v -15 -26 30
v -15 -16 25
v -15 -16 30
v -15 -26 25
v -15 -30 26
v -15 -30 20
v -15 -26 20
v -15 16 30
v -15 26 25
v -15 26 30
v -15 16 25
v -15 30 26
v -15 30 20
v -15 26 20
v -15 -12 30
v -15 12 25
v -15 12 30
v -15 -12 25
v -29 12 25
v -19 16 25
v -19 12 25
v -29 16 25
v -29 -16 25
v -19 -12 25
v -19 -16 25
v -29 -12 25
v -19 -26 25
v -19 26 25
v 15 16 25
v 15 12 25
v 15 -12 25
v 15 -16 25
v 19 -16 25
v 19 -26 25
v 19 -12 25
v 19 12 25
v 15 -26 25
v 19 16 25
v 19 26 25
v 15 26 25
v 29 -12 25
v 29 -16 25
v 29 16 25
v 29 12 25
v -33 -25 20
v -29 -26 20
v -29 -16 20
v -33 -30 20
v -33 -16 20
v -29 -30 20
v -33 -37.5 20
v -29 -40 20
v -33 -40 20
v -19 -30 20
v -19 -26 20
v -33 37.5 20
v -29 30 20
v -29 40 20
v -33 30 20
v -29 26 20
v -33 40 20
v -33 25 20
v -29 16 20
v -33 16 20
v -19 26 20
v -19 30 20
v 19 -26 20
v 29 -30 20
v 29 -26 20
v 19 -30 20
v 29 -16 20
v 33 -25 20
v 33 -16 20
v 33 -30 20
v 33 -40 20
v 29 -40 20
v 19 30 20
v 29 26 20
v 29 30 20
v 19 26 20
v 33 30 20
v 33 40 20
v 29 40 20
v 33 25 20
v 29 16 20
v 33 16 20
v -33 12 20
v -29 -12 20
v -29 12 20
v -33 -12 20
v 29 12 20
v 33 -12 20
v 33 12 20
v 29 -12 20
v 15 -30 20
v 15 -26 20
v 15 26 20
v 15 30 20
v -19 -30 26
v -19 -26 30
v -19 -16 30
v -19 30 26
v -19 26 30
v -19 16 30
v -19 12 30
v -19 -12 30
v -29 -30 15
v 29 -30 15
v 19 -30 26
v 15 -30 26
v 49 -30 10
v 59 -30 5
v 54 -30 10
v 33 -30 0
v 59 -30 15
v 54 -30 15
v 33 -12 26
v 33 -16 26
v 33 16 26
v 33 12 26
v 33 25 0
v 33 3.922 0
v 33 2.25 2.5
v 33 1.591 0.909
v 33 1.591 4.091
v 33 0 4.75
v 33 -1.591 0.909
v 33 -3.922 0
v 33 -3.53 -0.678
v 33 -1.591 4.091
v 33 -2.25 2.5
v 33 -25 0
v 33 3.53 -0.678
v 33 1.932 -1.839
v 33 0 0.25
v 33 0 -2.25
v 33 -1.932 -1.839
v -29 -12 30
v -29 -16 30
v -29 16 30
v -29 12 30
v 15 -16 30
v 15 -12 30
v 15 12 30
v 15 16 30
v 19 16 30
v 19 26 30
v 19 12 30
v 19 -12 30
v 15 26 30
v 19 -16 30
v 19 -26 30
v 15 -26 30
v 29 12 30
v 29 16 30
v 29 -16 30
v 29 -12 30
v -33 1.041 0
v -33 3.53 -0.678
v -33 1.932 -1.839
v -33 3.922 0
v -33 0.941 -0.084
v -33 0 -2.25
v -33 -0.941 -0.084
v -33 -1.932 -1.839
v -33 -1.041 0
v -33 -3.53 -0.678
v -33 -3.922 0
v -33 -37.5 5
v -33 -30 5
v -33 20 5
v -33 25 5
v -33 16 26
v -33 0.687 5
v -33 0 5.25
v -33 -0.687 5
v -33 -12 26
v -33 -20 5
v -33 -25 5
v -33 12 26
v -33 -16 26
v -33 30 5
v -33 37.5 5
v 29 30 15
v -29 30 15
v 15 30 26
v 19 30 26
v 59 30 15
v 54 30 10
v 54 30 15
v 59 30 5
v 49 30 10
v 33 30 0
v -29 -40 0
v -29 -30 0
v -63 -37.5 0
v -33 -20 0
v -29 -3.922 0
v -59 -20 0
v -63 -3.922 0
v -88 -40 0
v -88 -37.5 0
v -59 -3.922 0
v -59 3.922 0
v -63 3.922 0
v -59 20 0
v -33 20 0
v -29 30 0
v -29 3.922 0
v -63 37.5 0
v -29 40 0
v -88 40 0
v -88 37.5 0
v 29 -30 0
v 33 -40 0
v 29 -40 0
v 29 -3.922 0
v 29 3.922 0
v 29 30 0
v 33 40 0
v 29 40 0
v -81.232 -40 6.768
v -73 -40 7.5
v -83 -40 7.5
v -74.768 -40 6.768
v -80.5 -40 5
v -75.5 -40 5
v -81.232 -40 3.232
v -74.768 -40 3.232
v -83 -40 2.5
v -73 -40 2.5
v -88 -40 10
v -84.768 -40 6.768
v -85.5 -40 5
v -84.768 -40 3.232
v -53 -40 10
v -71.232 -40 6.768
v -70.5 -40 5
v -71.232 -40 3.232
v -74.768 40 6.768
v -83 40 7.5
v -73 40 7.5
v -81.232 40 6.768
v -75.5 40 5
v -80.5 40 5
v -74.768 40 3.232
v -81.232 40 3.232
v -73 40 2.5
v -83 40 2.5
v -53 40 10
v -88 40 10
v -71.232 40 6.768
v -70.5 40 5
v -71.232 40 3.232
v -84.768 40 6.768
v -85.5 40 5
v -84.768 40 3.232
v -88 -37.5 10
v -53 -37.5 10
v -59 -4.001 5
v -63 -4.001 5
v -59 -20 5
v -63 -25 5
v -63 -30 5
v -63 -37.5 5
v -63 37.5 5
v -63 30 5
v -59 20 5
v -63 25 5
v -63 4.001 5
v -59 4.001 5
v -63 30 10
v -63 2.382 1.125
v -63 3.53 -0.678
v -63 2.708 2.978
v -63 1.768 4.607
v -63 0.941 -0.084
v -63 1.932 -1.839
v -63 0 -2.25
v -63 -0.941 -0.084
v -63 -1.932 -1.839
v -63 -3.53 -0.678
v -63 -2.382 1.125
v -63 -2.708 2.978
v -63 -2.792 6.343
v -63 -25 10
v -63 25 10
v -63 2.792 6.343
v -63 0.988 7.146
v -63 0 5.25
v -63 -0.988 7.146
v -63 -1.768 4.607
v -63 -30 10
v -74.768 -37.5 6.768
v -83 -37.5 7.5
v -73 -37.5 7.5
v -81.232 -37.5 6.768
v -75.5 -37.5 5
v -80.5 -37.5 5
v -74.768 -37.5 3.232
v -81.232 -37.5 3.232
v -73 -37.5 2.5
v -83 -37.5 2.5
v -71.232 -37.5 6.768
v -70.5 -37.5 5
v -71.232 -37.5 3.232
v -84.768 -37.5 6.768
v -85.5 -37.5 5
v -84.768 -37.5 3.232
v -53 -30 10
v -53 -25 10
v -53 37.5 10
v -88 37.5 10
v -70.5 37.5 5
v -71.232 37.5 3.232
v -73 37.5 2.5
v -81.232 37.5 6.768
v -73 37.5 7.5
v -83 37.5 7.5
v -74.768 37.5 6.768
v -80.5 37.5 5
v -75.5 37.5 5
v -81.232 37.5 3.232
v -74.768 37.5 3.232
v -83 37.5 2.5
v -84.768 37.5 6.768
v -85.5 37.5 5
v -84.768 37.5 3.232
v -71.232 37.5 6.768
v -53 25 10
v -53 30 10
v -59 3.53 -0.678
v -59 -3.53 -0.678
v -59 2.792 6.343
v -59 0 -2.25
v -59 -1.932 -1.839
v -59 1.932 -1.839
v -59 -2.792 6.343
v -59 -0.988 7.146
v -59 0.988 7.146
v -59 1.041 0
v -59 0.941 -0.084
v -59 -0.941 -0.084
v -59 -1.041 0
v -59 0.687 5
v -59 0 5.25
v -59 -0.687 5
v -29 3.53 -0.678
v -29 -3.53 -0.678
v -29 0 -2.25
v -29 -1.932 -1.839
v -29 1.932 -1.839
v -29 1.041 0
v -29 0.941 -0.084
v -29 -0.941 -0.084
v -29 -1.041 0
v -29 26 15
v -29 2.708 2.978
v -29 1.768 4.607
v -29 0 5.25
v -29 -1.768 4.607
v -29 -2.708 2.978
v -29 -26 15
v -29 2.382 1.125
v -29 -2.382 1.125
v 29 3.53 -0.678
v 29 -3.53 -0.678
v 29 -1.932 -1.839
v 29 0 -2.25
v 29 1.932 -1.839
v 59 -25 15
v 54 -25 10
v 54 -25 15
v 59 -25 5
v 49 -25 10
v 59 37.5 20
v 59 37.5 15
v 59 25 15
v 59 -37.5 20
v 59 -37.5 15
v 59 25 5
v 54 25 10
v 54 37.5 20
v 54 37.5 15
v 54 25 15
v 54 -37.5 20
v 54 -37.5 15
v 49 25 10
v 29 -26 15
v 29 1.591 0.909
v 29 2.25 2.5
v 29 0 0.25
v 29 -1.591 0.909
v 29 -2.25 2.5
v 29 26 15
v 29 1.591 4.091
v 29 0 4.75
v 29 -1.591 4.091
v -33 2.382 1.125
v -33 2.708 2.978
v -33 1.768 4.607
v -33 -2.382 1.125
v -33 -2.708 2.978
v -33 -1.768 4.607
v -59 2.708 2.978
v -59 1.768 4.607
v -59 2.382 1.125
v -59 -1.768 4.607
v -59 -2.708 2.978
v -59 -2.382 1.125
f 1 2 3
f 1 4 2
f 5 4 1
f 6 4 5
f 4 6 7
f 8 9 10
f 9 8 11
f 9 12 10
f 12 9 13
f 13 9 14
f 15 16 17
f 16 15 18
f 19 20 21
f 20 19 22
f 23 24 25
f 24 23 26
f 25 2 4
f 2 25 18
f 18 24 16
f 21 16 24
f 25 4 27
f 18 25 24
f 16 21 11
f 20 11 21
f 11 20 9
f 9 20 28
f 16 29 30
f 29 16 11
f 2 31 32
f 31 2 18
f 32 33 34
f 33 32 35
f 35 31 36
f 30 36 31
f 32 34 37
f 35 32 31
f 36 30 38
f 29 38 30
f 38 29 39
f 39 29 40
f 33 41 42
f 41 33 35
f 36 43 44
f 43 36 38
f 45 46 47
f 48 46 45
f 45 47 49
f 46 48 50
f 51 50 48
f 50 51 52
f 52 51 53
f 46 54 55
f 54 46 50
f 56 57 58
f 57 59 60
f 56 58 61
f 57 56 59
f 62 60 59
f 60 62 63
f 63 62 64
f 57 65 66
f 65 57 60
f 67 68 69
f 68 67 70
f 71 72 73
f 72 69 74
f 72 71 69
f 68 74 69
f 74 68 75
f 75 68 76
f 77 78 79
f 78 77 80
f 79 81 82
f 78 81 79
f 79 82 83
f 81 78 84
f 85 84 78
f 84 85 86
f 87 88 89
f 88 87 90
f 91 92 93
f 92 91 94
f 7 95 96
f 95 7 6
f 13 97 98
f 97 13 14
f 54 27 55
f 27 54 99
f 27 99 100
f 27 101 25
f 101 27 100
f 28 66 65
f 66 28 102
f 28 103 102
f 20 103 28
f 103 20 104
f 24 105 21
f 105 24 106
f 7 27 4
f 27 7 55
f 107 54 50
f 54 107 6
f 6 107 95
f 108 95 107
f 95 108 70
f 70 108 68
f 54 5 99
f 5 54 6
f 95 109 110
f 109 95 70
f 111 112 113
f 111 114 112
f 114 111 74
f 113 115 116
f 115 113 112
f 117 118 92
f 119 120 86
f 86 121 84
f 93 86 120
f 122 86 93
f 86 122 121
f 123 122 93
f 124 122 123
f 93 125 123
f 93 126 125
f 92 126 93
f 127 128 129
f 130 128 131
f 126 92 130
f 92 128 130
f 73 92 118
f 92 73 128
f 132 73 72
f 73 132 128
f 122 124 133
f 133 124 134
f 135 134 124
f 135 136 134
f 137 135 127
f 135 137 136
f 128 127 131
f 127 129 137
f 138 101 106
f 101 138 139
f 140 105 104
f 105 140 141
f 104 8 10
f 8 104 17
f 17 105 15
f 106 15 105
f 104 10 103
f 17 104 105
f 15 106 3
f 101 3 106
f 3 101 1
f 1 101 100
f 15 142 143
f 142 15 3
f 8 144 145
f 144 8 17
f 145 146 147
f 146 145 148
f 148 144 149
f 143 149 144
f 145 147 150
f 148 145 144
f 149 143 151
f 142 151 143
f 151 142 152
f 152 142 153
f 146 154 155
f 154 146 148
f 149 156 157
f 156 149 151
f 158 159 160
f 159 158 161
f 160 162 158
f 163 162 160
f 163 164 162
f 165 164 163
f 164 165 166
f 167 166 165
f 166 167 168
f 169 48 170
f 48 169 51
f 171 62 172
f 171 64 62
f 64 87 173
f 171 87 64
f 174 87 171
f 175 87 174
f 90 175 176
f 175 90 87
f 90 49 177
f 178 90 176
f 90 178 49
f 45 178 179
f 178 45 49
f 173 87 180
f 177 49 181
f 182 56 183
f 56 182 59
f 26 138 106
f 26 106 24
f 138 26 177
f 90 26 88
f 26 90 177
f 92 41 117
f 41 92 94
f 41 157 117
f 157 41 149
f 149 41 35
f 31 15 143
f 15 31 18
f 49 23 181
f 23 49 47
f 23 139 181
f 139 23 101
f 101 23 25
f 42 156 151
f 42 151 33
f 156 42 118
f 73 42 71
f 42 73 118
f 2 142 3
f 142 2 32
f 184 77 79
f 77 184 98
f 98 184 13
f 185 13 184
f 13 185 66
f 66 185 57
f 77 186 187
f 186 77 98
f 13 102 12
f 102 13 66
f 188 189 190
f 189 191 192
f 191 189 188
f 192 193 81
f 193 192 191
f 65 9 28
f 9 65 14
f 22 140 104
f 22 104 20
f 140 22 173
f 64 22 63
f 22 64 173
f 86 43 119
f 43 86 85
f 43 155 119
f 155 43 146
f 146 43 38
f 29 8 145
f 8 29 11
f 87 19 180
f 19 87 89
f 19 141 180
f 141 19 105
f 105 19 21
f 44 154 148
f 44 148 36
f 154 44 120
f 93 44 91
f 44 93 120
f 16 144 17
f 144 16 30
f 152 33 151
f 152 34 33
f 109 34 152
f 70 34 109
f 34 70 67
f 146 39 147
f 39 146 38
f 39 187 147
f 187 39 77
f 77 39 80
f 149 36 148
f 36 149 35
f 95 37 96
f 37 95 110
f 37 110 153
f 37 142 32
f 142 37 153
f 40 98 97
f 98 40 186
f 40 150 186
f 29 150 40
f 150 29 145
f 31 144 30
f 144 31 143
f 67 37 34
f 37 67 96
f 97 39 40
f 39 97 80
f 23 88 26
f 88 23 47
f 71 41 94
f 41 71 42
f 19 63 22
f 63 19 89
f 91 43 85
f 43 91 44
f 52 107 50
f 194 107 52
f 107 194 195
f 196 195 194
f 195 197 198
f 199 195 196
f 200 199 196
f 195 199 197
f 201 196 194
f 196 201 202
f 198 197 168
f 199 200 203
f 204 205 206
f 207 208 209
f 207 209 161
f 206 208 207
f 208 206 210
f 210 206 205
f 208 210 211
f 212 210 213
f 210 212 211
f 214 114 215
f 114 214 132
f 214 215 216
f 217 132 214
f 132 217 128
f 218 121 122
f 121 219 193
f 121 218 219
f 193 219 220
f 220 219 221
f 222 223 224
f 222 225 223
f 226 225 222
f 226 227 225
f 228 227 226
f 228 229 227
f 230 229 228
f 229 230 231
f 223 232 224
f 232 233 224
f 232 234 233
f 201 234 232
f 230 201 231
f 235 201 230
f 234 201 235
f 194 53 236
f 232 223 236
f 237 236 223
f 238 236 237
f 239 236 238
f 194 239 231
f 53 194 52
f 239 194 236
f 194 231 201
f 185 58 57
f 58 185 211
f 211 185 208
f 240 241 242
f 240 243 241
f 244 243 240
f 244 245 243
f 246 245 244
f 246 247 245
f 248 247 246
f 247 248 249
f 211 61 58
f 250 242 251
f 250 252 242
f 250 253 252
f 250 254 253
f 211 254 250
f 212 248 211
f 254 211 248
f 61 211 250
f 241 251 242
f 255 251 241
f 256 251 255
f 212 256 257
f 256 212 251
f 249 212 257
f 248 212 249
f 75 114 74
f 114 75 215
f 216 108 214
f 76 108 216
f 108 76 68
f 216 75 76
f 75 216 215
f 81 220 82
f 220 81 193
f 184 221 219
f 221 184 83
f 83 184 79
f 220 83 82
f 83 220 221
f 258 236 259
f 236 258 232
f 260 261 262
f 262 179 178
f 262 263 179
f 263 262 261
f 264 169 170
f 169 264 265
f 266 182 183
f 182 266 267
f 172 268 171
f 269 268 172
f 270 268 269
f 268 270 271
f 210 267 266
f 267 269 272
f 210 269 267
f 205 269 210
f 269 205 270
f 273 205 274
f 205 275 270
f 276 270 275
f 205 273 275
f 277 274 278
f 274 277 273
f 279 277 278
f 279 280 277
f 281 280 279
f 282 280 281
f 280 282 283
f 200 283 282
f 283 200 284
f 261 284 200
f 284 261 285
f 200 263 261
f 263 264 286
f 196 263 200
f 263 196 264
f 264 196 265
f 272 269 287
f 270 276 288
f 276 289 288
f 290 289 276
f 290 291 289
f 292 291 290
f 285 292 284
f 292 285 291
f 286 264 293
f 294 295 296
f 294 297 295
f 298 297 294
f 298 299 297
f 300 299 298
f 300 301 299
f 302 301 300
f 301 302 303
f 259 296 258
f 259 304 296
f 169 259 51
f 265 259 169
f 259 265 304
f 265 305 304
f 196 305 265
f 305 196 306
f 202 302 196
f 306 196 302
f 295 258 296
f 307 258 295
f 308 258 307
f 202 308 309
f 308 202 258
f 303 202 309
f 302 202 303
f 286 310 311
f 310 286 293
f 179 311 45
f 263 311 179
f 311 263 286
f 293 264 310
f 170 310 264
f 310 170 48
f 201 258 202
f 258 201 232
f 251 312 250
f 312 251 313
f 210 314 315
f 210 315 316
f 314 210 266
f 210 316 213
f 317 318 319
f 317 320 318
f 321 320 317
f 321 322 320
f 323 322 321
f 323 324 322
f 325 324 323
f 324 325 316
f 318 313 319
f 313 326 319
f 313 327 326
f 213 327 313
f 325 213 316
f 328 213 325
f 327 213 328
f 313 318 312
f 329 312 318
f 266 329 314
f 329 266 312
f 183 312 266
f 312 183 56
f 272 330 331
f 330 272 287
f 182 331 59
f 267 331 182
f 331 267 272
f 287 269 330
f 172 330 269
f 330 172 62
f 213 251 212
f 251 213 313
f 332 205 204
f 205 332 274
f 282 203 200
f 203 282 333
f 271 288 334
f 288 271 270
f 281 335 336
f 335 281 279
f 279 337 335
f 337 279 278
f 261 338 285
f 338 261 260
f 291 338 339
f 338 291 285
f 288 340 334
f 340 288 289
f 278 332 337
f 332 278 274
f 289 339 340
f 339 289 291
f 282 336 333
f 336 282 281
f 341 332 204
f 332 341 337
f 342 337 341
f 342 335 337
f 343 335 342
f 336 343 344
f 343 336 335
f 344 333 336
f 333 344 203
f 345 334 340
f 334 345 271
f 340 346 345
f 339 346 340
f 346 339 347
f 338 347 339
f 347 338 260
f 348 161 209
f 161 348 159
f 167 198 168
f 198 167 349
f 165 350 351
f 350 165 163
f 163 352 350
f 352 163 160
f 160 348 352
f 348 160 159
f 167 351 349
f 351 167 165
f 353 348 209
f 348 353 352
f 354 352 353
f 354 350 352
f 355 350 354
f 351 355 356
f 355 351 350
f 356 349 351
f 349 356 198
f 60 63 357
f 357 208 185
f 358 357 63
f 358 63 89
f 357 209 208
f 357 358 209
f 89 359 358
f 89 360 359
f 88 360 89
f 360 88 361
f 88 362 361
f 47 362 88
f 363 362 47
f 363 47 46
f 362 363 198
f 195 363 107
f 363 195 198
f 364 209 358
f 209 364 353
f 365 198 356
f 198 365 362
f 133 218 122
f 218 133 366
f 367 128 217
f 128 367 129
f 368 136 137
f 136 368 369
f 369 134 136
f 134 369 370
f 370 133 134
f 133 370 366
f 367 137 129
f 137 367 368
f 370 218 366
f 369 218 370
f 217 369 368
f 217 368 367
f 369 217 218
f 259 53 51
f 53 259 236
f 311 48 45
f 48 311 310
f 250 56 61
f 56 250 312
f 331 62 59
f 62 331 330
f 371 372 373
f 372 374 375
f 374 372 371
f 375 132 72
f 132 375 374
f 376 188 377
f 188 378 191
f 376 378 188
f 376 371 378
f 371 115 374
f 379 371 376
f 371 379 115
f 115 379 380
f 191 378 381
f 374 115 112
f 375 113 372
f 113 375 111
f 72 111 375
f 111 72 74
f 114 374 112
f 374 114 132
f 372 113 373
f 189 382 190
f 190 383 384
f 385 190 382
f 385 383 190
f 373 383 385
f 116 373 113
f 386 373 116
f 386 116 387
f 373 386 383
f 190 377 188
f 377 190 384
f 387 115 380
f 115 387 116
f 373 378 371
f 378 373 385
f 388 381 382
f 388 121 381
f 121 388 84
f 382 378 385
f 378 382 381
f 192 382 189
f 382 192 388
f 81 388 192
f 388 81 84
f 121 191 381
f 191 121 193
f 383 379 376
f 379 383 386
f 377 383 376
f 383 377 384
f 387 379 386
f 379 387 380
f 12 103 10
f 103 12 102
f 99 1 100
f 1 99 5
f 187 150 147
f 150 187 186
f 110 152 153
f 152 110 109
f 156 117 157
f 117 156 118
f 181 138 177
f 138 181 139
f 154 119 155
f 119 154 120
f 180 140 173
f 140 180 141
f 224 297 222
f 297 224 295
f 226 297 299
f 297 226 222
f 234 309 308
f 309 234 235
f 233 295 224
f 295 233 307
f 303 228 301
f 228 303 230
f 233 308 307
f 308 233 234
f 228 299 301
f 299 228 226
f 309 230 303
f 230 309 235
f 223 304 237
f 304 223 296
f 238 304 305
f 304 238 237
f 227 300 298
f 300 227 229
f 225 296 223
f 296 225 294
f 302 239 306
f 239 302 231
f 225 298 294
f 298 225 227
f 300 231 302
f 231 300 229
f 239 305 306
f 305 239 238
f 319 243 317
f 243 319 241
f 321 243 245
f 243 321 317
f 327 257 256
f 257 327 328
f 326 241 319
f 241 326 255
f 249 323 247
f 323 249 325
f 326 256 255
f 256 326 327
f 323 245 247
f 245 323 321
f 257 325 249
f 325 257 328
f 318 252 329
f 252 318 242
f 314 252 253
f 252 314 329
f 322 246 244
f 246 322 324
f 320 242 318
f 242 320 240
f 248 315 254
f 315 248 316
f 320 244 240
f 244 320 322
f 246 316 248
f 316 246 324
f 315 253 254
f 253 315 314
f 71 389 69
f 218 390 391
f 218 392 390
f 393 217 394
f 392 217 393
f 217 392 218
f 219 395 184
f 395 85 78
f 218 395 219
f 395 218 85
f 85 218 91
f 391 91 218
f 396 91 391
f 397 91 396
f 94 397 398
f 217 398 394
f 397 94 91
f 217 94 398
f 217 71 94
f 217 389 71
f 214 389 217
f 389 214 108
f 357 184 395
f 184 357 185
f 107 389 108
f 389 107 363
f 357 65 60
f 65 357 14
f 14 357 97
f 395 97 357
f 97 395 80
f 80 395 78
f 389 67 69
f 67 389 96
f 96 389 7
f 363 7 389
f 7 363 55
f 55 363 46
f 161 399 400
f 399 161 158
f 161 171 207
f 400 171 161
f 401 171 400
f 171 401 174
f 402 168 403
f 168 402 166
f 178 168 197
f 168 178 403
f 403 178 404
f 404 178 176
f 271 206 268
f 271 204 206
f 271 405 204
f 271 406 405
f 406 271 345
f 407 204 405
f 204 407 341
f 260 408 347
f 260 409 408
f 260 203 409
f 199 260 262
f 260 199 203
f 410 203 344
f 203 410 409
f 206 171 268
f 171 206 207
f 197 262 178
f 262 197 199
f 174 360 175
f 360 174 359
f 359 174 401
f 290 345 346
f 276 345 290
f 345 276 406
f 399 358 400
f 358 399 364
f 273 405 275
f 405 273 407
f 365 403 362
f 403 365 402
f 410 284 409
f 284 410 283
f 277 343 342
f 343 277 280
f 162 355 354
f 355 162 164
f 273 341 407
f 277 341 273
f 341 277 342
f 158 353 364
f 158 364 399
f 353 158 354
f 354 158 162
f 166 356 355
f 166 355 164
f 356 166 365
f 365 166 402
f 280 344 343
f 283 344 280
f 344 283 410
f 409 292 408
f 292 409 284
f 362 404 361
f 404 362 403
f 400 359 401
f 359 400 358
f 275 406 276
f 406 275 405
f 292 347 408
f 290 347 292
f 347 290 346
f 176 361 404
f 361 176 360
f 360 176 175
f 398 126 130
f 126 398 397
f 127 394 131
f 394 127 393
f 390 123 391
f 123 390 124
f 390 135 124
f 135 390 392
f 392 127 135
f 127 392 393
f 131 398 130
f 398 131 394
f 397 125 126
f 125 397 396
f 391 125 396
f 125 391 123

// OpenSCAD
/*
 * Copyright (c) 2026 Patrick Charon
 * Licensed under CERN-OHL-P <https://cern-ohl.web.cern.ch/>
*/

frame_width = 80;
frame_thickness = 5;
border_height = 5;
border_width = 2.5;
border_thickness = frame_thickness + border_height;

arch_width = 60;
arch_length = 66;
arch_height = 20;

beam_width = 4;
arch_thickness = 5;

grid_offset = 10;

front_step_length = 30;

mount_bracket_length = 25;
mount_screw_spacing = 10;
mount_screw_offset = 2.5;
mount_screw_diameter = 5;

shaft_diameter = 5.5;

axle_screw_diameter = 4.5;

tail_length = 26;
rear_bumper_width = 75;

module rear_frame() {
    difference() {
        union() {
            translate([0, 0, arch_height / 2]) {
                cube([arch_length, arch_width, arch_height], center = true);
            }

            for (x = [beam_width * 3 / 2 + grid_offset, arch_length - beam_width * 3 / 2 - grid_offset]) {
                for (y = [-1, 1]) {
                    translate([
                        x - arch_length / 2,
                        y * (arch_width - beam_width) / 2,
                        arch_height + frame_thickness / 2
                    ]) {
                        cube([
                            beam_width,
                            beam_width,
                            frame_thickness
                        ], center = true);
                    }

                    translate([
                        0,
                        y * (arch_width / 2 - grid_offset - beam_width * 3 / 2),
                        arch_height + arch_thickness / 2 + frame_thickness
                    ]) {
                        cube([
                            arch_length,
                            beam_width,
                            arch_thickness
                        ], center = true);
                    }
                }
            }

            for (y = [beam_width * 3 / 2 + grid_offset, arch_width - beam_width * 3 / 2 - grid_offset]) {
                for (x = [-1, 1]) {
                    translate([
                        x * (arch_length - beam_width) / 2,
                        y - arch_width / 2,
                        arch_height + frame_thickness / 2
                    ]) {
                        cube([
                            beam_width,
                            beam_width,
                            frame_thickness
                        ], center = true);
                    }

                    translate([
                        x * (arch_length / 2 - grid_offset - beam_width * 3 / 2),
                        0,
                        arch_height + arch_thickness / 2 + frame_thickness
                    ]) {
                        cube([
                            beam_width,
                            arch_width,
                            arch_thickness
                        ], center = true);
                    }
                }
            }

            for (x = [-1, 1]) {
                for (y = [-1, 1]) {
                    translate([
                        x * (arch_length - beam_width) / 2,
                        y * (arch_width / 2 + (frame_width - arch_width) /4),
                        arch_height / 2
                    ]) {
                        cube([
                            beam_width,
                            (frame_width - arch_width) / 2,
                            arch_height
                        ], center = true);
                    }
                }
            }

            translate([
                -(arch_length + front_step_length) / 2,
                0,
                frame_thickness / 2
            ]) {
                cube([
                    front_step_length,
                    frame_width,
                    frame_thickness
                ], center = true);
            }

            for (y = [-1, 1]) {
                translate([
                    -(arch_length + front_step_length) / 2,
                    y * (frame_width - border_width) / 2,
                    border_height / 2 + frame_thickness
                ]) {
                    cube([
                        front_step_length,
                        border_width,
                        border_height
                    ], center = true);
                }

                translate([
                    -(arch_length / 2 + front_step_length / 2),
                    y * (arch_width - frame_thickness) / 2,
                    border_height / 2 + frame_thickness
                ]) {
                    cube([
                        front_step_length,
                        frame_thickness,
                        border_height
                    ], center = true);
                }

                translate([
                    -(arch_length / 2 + front_step_length + mount_bracket_length / 2),
                    y * (frame_width - border_width) / 2,
                    border_thickness / 2
                ]) {
                    cube([
                        mount_bracket_length,
                        border_width,
                        border_thickness
                    ], center = true);
                }
            }

            for (y = [-1, 1]) {
                translate([
                    -arch_length / 2,
                    y * (frame_width - border_width) / 2,
                    border_thickness
                ]) rotate([90, 0, 0]) {
                    triangle_side = arch_height - border_thickness;

                    linear_extrude(border_width, center=true)
                        polygon([
                            [-2 * triangle_side, 0],
                            [0, 0],
                            [0, triangle_side]
                        ]);
                }

                translate([
                    -arch_length / 2,
                    y * (arch_width - frame_thickness) / 2,
                    border_thickness
                ]) rotate([90, 0, 0]) {
                    triangle_side = arch_height - border_thickness;

                    linear_extrude(frame_thickness, center=true)
                        polygon([
                            [-2 * triangle_side, 0],
                            [0, 0],
                            [0, triangle_side]
                        ]);
                }

                for (x = [-(arch_length / 2 + front_step_length), -(arch_length / 2), arch_length / 2 - beam_width]) {
                    translate([
                        x,//-(arch_length / 2 + front_step_length),
                        0,
                        frame_thickness / 2
                    ]) rotate([0, 90, 0]) {
                        cylinder(d = shaft_diameter + beam_width, h = beam_width);
                    }
                }

            }

            for (y = [-1, 1]) {
                translate([
                    arch_length / 2,
                    y * (arch_width - frame_thickness) / 2,
                    0
                ]) rotate([90, 0, 0]) {
                    linear_extrude(frame_thickness, center = true) {
                        polygon([
                            [0, 0],
                            [tail_length, frame_thickness],
                            [tail_length, 2 * frame_thickness],
                            [tail_length - 2 * frame_thickness, 2 * frame_thickness],
                            [0, 4 * frame_thickness]
                        ]);
                    }

                    translate([
                        tail_length - frame_thickness / 2,
                        5/2 * frame_thickness,
                        0
                    ]) {
                        cube(frame_thickness, center = true);
                    }
                }
            }

            translate([
                arch_length / 2 + tail_length - frame_thickness / 2,
                0,
                7/2 * frame_thickness
            ]) {
                cube([
                    frame_thickness,
                    rear_bumper_width,
                    frame_thickness
                ], center = true);
            }
        }

        union() {
            translate([0, 0, (arch_height - arch_thickness) / 2]) {
                cube([
                    arch_length - 2 * beam_width,
                    arch_width,
                    arch_height - arch_thickness
                ], center = true);
            }

            translate([0, 0, arch_height - arch_thickness / 2]) {
                cube([
                    arch_length - 2 * beam_width,
                    arch_width - 2 * beam_width,
                    arch_thickness
                ], center = true);
            }

            for (x = [-1, 1]) {
                translate([
                    x * (arch_length / 2 - grid_offset - beam_width * 3 / 2),
                    arch_width / 2 - beam_width,
                    arch_height + arch_thickness + (arch_thickness - beam_width)
                ]) rotate([0, -90, 0]) {
                    linear_extrude(beam_width, center = true)
                        polygon([
                            [0, beam_width],
                            [beam_width, 0],
                            [beam_width, beam_width]
                        ]);
                }

                translate([
                    x * (arch_length / 2 - grid_offset - beam_width * 3 / 2),
                    -arch_width / 2 + beam_width,
                    arch_height + arch_thickness + (arch_thickness - beam_width)
                ]) rotate([180, -90, 0]) {
                    linear_extrude(beam_width, center = true)
                        polygon([
                            [0, beam_width],
                            [beam_width, 0],
                            [beam_width, beam_width]
                        ]);
                }
            }

            for (y = [-1, 1]) {
                translate([
                    arch_length / 2 - beam_width,
                    y * (arch_width / 2 - grid_offset - beam_width * 3 / 2),
                    arch_height + arch_thickness + (arch_thickness - beam_width)
                ]) rotate([0, -90, -90]) {
                    linear_extrude(beam_width, center = true)
                        polygon([
                            [0, beam_width],
                            [beam_width, 0],
                            [beam_width, beam_width]
                        ]);
                }

                translate([
                    -arch_length / 2 + beam_width,
                    y * (arch_width / 2 - grid_offset - beam_width * 3 / 2),
                    arch_height + arch_thickness + (arch_thickness - beam_width)
                ]) rotate([0, -90, 90]) {
                    linear_extrude(beam_width, center = true)
                        polygon([
                            [0, beam_width],
                            [beam_width, 0],
                            [beam_width, beam_width]
                        ]);
                }
            }

            translate([
                -(arch_length + front_step_length - beam_width) / 2,
                0,
                frame_thickness / 2
            ]) {
                cube([
                    front_step_length - beam_width,
                    arch_width - frame_thickness * 4,
                    frame_thickness
                ], center = true);
            }

            translate([
                -(arch_length / 2 - beam_width),
                0,
                frame_thickness / 2
            ]) rotate([0, -90, 0]) {
                cylinder(d = shaft_diameter, h = front_step_length + beam_width);
            }

            translate([
                arch_length / 2 - beam_width,
                0,
                frame_thickness / 2
            ]) rotate([0, 90, 0]) {
                cylinder(d = axle_screw_diameter, h = beam_width);
            }

            for (y = [-1, 1]) {
                for (x = [0, mount_screw_spacing]) {
                    translate([
                        -(arch_length / 2 + front_step_length + mount_bracket_length - mount_screw_offset - mount_screw_diameter / 2 - x),
                        y * (frame_width - border_width) / 2,
                        border_thickness / 2
                    ]) rotate([90, 0, 0]) {
                        cylinder(d = mount_screw_diameter, h = border_width, center = true);
                    }
                }
            }
        }
    }
}

rear_frame();
